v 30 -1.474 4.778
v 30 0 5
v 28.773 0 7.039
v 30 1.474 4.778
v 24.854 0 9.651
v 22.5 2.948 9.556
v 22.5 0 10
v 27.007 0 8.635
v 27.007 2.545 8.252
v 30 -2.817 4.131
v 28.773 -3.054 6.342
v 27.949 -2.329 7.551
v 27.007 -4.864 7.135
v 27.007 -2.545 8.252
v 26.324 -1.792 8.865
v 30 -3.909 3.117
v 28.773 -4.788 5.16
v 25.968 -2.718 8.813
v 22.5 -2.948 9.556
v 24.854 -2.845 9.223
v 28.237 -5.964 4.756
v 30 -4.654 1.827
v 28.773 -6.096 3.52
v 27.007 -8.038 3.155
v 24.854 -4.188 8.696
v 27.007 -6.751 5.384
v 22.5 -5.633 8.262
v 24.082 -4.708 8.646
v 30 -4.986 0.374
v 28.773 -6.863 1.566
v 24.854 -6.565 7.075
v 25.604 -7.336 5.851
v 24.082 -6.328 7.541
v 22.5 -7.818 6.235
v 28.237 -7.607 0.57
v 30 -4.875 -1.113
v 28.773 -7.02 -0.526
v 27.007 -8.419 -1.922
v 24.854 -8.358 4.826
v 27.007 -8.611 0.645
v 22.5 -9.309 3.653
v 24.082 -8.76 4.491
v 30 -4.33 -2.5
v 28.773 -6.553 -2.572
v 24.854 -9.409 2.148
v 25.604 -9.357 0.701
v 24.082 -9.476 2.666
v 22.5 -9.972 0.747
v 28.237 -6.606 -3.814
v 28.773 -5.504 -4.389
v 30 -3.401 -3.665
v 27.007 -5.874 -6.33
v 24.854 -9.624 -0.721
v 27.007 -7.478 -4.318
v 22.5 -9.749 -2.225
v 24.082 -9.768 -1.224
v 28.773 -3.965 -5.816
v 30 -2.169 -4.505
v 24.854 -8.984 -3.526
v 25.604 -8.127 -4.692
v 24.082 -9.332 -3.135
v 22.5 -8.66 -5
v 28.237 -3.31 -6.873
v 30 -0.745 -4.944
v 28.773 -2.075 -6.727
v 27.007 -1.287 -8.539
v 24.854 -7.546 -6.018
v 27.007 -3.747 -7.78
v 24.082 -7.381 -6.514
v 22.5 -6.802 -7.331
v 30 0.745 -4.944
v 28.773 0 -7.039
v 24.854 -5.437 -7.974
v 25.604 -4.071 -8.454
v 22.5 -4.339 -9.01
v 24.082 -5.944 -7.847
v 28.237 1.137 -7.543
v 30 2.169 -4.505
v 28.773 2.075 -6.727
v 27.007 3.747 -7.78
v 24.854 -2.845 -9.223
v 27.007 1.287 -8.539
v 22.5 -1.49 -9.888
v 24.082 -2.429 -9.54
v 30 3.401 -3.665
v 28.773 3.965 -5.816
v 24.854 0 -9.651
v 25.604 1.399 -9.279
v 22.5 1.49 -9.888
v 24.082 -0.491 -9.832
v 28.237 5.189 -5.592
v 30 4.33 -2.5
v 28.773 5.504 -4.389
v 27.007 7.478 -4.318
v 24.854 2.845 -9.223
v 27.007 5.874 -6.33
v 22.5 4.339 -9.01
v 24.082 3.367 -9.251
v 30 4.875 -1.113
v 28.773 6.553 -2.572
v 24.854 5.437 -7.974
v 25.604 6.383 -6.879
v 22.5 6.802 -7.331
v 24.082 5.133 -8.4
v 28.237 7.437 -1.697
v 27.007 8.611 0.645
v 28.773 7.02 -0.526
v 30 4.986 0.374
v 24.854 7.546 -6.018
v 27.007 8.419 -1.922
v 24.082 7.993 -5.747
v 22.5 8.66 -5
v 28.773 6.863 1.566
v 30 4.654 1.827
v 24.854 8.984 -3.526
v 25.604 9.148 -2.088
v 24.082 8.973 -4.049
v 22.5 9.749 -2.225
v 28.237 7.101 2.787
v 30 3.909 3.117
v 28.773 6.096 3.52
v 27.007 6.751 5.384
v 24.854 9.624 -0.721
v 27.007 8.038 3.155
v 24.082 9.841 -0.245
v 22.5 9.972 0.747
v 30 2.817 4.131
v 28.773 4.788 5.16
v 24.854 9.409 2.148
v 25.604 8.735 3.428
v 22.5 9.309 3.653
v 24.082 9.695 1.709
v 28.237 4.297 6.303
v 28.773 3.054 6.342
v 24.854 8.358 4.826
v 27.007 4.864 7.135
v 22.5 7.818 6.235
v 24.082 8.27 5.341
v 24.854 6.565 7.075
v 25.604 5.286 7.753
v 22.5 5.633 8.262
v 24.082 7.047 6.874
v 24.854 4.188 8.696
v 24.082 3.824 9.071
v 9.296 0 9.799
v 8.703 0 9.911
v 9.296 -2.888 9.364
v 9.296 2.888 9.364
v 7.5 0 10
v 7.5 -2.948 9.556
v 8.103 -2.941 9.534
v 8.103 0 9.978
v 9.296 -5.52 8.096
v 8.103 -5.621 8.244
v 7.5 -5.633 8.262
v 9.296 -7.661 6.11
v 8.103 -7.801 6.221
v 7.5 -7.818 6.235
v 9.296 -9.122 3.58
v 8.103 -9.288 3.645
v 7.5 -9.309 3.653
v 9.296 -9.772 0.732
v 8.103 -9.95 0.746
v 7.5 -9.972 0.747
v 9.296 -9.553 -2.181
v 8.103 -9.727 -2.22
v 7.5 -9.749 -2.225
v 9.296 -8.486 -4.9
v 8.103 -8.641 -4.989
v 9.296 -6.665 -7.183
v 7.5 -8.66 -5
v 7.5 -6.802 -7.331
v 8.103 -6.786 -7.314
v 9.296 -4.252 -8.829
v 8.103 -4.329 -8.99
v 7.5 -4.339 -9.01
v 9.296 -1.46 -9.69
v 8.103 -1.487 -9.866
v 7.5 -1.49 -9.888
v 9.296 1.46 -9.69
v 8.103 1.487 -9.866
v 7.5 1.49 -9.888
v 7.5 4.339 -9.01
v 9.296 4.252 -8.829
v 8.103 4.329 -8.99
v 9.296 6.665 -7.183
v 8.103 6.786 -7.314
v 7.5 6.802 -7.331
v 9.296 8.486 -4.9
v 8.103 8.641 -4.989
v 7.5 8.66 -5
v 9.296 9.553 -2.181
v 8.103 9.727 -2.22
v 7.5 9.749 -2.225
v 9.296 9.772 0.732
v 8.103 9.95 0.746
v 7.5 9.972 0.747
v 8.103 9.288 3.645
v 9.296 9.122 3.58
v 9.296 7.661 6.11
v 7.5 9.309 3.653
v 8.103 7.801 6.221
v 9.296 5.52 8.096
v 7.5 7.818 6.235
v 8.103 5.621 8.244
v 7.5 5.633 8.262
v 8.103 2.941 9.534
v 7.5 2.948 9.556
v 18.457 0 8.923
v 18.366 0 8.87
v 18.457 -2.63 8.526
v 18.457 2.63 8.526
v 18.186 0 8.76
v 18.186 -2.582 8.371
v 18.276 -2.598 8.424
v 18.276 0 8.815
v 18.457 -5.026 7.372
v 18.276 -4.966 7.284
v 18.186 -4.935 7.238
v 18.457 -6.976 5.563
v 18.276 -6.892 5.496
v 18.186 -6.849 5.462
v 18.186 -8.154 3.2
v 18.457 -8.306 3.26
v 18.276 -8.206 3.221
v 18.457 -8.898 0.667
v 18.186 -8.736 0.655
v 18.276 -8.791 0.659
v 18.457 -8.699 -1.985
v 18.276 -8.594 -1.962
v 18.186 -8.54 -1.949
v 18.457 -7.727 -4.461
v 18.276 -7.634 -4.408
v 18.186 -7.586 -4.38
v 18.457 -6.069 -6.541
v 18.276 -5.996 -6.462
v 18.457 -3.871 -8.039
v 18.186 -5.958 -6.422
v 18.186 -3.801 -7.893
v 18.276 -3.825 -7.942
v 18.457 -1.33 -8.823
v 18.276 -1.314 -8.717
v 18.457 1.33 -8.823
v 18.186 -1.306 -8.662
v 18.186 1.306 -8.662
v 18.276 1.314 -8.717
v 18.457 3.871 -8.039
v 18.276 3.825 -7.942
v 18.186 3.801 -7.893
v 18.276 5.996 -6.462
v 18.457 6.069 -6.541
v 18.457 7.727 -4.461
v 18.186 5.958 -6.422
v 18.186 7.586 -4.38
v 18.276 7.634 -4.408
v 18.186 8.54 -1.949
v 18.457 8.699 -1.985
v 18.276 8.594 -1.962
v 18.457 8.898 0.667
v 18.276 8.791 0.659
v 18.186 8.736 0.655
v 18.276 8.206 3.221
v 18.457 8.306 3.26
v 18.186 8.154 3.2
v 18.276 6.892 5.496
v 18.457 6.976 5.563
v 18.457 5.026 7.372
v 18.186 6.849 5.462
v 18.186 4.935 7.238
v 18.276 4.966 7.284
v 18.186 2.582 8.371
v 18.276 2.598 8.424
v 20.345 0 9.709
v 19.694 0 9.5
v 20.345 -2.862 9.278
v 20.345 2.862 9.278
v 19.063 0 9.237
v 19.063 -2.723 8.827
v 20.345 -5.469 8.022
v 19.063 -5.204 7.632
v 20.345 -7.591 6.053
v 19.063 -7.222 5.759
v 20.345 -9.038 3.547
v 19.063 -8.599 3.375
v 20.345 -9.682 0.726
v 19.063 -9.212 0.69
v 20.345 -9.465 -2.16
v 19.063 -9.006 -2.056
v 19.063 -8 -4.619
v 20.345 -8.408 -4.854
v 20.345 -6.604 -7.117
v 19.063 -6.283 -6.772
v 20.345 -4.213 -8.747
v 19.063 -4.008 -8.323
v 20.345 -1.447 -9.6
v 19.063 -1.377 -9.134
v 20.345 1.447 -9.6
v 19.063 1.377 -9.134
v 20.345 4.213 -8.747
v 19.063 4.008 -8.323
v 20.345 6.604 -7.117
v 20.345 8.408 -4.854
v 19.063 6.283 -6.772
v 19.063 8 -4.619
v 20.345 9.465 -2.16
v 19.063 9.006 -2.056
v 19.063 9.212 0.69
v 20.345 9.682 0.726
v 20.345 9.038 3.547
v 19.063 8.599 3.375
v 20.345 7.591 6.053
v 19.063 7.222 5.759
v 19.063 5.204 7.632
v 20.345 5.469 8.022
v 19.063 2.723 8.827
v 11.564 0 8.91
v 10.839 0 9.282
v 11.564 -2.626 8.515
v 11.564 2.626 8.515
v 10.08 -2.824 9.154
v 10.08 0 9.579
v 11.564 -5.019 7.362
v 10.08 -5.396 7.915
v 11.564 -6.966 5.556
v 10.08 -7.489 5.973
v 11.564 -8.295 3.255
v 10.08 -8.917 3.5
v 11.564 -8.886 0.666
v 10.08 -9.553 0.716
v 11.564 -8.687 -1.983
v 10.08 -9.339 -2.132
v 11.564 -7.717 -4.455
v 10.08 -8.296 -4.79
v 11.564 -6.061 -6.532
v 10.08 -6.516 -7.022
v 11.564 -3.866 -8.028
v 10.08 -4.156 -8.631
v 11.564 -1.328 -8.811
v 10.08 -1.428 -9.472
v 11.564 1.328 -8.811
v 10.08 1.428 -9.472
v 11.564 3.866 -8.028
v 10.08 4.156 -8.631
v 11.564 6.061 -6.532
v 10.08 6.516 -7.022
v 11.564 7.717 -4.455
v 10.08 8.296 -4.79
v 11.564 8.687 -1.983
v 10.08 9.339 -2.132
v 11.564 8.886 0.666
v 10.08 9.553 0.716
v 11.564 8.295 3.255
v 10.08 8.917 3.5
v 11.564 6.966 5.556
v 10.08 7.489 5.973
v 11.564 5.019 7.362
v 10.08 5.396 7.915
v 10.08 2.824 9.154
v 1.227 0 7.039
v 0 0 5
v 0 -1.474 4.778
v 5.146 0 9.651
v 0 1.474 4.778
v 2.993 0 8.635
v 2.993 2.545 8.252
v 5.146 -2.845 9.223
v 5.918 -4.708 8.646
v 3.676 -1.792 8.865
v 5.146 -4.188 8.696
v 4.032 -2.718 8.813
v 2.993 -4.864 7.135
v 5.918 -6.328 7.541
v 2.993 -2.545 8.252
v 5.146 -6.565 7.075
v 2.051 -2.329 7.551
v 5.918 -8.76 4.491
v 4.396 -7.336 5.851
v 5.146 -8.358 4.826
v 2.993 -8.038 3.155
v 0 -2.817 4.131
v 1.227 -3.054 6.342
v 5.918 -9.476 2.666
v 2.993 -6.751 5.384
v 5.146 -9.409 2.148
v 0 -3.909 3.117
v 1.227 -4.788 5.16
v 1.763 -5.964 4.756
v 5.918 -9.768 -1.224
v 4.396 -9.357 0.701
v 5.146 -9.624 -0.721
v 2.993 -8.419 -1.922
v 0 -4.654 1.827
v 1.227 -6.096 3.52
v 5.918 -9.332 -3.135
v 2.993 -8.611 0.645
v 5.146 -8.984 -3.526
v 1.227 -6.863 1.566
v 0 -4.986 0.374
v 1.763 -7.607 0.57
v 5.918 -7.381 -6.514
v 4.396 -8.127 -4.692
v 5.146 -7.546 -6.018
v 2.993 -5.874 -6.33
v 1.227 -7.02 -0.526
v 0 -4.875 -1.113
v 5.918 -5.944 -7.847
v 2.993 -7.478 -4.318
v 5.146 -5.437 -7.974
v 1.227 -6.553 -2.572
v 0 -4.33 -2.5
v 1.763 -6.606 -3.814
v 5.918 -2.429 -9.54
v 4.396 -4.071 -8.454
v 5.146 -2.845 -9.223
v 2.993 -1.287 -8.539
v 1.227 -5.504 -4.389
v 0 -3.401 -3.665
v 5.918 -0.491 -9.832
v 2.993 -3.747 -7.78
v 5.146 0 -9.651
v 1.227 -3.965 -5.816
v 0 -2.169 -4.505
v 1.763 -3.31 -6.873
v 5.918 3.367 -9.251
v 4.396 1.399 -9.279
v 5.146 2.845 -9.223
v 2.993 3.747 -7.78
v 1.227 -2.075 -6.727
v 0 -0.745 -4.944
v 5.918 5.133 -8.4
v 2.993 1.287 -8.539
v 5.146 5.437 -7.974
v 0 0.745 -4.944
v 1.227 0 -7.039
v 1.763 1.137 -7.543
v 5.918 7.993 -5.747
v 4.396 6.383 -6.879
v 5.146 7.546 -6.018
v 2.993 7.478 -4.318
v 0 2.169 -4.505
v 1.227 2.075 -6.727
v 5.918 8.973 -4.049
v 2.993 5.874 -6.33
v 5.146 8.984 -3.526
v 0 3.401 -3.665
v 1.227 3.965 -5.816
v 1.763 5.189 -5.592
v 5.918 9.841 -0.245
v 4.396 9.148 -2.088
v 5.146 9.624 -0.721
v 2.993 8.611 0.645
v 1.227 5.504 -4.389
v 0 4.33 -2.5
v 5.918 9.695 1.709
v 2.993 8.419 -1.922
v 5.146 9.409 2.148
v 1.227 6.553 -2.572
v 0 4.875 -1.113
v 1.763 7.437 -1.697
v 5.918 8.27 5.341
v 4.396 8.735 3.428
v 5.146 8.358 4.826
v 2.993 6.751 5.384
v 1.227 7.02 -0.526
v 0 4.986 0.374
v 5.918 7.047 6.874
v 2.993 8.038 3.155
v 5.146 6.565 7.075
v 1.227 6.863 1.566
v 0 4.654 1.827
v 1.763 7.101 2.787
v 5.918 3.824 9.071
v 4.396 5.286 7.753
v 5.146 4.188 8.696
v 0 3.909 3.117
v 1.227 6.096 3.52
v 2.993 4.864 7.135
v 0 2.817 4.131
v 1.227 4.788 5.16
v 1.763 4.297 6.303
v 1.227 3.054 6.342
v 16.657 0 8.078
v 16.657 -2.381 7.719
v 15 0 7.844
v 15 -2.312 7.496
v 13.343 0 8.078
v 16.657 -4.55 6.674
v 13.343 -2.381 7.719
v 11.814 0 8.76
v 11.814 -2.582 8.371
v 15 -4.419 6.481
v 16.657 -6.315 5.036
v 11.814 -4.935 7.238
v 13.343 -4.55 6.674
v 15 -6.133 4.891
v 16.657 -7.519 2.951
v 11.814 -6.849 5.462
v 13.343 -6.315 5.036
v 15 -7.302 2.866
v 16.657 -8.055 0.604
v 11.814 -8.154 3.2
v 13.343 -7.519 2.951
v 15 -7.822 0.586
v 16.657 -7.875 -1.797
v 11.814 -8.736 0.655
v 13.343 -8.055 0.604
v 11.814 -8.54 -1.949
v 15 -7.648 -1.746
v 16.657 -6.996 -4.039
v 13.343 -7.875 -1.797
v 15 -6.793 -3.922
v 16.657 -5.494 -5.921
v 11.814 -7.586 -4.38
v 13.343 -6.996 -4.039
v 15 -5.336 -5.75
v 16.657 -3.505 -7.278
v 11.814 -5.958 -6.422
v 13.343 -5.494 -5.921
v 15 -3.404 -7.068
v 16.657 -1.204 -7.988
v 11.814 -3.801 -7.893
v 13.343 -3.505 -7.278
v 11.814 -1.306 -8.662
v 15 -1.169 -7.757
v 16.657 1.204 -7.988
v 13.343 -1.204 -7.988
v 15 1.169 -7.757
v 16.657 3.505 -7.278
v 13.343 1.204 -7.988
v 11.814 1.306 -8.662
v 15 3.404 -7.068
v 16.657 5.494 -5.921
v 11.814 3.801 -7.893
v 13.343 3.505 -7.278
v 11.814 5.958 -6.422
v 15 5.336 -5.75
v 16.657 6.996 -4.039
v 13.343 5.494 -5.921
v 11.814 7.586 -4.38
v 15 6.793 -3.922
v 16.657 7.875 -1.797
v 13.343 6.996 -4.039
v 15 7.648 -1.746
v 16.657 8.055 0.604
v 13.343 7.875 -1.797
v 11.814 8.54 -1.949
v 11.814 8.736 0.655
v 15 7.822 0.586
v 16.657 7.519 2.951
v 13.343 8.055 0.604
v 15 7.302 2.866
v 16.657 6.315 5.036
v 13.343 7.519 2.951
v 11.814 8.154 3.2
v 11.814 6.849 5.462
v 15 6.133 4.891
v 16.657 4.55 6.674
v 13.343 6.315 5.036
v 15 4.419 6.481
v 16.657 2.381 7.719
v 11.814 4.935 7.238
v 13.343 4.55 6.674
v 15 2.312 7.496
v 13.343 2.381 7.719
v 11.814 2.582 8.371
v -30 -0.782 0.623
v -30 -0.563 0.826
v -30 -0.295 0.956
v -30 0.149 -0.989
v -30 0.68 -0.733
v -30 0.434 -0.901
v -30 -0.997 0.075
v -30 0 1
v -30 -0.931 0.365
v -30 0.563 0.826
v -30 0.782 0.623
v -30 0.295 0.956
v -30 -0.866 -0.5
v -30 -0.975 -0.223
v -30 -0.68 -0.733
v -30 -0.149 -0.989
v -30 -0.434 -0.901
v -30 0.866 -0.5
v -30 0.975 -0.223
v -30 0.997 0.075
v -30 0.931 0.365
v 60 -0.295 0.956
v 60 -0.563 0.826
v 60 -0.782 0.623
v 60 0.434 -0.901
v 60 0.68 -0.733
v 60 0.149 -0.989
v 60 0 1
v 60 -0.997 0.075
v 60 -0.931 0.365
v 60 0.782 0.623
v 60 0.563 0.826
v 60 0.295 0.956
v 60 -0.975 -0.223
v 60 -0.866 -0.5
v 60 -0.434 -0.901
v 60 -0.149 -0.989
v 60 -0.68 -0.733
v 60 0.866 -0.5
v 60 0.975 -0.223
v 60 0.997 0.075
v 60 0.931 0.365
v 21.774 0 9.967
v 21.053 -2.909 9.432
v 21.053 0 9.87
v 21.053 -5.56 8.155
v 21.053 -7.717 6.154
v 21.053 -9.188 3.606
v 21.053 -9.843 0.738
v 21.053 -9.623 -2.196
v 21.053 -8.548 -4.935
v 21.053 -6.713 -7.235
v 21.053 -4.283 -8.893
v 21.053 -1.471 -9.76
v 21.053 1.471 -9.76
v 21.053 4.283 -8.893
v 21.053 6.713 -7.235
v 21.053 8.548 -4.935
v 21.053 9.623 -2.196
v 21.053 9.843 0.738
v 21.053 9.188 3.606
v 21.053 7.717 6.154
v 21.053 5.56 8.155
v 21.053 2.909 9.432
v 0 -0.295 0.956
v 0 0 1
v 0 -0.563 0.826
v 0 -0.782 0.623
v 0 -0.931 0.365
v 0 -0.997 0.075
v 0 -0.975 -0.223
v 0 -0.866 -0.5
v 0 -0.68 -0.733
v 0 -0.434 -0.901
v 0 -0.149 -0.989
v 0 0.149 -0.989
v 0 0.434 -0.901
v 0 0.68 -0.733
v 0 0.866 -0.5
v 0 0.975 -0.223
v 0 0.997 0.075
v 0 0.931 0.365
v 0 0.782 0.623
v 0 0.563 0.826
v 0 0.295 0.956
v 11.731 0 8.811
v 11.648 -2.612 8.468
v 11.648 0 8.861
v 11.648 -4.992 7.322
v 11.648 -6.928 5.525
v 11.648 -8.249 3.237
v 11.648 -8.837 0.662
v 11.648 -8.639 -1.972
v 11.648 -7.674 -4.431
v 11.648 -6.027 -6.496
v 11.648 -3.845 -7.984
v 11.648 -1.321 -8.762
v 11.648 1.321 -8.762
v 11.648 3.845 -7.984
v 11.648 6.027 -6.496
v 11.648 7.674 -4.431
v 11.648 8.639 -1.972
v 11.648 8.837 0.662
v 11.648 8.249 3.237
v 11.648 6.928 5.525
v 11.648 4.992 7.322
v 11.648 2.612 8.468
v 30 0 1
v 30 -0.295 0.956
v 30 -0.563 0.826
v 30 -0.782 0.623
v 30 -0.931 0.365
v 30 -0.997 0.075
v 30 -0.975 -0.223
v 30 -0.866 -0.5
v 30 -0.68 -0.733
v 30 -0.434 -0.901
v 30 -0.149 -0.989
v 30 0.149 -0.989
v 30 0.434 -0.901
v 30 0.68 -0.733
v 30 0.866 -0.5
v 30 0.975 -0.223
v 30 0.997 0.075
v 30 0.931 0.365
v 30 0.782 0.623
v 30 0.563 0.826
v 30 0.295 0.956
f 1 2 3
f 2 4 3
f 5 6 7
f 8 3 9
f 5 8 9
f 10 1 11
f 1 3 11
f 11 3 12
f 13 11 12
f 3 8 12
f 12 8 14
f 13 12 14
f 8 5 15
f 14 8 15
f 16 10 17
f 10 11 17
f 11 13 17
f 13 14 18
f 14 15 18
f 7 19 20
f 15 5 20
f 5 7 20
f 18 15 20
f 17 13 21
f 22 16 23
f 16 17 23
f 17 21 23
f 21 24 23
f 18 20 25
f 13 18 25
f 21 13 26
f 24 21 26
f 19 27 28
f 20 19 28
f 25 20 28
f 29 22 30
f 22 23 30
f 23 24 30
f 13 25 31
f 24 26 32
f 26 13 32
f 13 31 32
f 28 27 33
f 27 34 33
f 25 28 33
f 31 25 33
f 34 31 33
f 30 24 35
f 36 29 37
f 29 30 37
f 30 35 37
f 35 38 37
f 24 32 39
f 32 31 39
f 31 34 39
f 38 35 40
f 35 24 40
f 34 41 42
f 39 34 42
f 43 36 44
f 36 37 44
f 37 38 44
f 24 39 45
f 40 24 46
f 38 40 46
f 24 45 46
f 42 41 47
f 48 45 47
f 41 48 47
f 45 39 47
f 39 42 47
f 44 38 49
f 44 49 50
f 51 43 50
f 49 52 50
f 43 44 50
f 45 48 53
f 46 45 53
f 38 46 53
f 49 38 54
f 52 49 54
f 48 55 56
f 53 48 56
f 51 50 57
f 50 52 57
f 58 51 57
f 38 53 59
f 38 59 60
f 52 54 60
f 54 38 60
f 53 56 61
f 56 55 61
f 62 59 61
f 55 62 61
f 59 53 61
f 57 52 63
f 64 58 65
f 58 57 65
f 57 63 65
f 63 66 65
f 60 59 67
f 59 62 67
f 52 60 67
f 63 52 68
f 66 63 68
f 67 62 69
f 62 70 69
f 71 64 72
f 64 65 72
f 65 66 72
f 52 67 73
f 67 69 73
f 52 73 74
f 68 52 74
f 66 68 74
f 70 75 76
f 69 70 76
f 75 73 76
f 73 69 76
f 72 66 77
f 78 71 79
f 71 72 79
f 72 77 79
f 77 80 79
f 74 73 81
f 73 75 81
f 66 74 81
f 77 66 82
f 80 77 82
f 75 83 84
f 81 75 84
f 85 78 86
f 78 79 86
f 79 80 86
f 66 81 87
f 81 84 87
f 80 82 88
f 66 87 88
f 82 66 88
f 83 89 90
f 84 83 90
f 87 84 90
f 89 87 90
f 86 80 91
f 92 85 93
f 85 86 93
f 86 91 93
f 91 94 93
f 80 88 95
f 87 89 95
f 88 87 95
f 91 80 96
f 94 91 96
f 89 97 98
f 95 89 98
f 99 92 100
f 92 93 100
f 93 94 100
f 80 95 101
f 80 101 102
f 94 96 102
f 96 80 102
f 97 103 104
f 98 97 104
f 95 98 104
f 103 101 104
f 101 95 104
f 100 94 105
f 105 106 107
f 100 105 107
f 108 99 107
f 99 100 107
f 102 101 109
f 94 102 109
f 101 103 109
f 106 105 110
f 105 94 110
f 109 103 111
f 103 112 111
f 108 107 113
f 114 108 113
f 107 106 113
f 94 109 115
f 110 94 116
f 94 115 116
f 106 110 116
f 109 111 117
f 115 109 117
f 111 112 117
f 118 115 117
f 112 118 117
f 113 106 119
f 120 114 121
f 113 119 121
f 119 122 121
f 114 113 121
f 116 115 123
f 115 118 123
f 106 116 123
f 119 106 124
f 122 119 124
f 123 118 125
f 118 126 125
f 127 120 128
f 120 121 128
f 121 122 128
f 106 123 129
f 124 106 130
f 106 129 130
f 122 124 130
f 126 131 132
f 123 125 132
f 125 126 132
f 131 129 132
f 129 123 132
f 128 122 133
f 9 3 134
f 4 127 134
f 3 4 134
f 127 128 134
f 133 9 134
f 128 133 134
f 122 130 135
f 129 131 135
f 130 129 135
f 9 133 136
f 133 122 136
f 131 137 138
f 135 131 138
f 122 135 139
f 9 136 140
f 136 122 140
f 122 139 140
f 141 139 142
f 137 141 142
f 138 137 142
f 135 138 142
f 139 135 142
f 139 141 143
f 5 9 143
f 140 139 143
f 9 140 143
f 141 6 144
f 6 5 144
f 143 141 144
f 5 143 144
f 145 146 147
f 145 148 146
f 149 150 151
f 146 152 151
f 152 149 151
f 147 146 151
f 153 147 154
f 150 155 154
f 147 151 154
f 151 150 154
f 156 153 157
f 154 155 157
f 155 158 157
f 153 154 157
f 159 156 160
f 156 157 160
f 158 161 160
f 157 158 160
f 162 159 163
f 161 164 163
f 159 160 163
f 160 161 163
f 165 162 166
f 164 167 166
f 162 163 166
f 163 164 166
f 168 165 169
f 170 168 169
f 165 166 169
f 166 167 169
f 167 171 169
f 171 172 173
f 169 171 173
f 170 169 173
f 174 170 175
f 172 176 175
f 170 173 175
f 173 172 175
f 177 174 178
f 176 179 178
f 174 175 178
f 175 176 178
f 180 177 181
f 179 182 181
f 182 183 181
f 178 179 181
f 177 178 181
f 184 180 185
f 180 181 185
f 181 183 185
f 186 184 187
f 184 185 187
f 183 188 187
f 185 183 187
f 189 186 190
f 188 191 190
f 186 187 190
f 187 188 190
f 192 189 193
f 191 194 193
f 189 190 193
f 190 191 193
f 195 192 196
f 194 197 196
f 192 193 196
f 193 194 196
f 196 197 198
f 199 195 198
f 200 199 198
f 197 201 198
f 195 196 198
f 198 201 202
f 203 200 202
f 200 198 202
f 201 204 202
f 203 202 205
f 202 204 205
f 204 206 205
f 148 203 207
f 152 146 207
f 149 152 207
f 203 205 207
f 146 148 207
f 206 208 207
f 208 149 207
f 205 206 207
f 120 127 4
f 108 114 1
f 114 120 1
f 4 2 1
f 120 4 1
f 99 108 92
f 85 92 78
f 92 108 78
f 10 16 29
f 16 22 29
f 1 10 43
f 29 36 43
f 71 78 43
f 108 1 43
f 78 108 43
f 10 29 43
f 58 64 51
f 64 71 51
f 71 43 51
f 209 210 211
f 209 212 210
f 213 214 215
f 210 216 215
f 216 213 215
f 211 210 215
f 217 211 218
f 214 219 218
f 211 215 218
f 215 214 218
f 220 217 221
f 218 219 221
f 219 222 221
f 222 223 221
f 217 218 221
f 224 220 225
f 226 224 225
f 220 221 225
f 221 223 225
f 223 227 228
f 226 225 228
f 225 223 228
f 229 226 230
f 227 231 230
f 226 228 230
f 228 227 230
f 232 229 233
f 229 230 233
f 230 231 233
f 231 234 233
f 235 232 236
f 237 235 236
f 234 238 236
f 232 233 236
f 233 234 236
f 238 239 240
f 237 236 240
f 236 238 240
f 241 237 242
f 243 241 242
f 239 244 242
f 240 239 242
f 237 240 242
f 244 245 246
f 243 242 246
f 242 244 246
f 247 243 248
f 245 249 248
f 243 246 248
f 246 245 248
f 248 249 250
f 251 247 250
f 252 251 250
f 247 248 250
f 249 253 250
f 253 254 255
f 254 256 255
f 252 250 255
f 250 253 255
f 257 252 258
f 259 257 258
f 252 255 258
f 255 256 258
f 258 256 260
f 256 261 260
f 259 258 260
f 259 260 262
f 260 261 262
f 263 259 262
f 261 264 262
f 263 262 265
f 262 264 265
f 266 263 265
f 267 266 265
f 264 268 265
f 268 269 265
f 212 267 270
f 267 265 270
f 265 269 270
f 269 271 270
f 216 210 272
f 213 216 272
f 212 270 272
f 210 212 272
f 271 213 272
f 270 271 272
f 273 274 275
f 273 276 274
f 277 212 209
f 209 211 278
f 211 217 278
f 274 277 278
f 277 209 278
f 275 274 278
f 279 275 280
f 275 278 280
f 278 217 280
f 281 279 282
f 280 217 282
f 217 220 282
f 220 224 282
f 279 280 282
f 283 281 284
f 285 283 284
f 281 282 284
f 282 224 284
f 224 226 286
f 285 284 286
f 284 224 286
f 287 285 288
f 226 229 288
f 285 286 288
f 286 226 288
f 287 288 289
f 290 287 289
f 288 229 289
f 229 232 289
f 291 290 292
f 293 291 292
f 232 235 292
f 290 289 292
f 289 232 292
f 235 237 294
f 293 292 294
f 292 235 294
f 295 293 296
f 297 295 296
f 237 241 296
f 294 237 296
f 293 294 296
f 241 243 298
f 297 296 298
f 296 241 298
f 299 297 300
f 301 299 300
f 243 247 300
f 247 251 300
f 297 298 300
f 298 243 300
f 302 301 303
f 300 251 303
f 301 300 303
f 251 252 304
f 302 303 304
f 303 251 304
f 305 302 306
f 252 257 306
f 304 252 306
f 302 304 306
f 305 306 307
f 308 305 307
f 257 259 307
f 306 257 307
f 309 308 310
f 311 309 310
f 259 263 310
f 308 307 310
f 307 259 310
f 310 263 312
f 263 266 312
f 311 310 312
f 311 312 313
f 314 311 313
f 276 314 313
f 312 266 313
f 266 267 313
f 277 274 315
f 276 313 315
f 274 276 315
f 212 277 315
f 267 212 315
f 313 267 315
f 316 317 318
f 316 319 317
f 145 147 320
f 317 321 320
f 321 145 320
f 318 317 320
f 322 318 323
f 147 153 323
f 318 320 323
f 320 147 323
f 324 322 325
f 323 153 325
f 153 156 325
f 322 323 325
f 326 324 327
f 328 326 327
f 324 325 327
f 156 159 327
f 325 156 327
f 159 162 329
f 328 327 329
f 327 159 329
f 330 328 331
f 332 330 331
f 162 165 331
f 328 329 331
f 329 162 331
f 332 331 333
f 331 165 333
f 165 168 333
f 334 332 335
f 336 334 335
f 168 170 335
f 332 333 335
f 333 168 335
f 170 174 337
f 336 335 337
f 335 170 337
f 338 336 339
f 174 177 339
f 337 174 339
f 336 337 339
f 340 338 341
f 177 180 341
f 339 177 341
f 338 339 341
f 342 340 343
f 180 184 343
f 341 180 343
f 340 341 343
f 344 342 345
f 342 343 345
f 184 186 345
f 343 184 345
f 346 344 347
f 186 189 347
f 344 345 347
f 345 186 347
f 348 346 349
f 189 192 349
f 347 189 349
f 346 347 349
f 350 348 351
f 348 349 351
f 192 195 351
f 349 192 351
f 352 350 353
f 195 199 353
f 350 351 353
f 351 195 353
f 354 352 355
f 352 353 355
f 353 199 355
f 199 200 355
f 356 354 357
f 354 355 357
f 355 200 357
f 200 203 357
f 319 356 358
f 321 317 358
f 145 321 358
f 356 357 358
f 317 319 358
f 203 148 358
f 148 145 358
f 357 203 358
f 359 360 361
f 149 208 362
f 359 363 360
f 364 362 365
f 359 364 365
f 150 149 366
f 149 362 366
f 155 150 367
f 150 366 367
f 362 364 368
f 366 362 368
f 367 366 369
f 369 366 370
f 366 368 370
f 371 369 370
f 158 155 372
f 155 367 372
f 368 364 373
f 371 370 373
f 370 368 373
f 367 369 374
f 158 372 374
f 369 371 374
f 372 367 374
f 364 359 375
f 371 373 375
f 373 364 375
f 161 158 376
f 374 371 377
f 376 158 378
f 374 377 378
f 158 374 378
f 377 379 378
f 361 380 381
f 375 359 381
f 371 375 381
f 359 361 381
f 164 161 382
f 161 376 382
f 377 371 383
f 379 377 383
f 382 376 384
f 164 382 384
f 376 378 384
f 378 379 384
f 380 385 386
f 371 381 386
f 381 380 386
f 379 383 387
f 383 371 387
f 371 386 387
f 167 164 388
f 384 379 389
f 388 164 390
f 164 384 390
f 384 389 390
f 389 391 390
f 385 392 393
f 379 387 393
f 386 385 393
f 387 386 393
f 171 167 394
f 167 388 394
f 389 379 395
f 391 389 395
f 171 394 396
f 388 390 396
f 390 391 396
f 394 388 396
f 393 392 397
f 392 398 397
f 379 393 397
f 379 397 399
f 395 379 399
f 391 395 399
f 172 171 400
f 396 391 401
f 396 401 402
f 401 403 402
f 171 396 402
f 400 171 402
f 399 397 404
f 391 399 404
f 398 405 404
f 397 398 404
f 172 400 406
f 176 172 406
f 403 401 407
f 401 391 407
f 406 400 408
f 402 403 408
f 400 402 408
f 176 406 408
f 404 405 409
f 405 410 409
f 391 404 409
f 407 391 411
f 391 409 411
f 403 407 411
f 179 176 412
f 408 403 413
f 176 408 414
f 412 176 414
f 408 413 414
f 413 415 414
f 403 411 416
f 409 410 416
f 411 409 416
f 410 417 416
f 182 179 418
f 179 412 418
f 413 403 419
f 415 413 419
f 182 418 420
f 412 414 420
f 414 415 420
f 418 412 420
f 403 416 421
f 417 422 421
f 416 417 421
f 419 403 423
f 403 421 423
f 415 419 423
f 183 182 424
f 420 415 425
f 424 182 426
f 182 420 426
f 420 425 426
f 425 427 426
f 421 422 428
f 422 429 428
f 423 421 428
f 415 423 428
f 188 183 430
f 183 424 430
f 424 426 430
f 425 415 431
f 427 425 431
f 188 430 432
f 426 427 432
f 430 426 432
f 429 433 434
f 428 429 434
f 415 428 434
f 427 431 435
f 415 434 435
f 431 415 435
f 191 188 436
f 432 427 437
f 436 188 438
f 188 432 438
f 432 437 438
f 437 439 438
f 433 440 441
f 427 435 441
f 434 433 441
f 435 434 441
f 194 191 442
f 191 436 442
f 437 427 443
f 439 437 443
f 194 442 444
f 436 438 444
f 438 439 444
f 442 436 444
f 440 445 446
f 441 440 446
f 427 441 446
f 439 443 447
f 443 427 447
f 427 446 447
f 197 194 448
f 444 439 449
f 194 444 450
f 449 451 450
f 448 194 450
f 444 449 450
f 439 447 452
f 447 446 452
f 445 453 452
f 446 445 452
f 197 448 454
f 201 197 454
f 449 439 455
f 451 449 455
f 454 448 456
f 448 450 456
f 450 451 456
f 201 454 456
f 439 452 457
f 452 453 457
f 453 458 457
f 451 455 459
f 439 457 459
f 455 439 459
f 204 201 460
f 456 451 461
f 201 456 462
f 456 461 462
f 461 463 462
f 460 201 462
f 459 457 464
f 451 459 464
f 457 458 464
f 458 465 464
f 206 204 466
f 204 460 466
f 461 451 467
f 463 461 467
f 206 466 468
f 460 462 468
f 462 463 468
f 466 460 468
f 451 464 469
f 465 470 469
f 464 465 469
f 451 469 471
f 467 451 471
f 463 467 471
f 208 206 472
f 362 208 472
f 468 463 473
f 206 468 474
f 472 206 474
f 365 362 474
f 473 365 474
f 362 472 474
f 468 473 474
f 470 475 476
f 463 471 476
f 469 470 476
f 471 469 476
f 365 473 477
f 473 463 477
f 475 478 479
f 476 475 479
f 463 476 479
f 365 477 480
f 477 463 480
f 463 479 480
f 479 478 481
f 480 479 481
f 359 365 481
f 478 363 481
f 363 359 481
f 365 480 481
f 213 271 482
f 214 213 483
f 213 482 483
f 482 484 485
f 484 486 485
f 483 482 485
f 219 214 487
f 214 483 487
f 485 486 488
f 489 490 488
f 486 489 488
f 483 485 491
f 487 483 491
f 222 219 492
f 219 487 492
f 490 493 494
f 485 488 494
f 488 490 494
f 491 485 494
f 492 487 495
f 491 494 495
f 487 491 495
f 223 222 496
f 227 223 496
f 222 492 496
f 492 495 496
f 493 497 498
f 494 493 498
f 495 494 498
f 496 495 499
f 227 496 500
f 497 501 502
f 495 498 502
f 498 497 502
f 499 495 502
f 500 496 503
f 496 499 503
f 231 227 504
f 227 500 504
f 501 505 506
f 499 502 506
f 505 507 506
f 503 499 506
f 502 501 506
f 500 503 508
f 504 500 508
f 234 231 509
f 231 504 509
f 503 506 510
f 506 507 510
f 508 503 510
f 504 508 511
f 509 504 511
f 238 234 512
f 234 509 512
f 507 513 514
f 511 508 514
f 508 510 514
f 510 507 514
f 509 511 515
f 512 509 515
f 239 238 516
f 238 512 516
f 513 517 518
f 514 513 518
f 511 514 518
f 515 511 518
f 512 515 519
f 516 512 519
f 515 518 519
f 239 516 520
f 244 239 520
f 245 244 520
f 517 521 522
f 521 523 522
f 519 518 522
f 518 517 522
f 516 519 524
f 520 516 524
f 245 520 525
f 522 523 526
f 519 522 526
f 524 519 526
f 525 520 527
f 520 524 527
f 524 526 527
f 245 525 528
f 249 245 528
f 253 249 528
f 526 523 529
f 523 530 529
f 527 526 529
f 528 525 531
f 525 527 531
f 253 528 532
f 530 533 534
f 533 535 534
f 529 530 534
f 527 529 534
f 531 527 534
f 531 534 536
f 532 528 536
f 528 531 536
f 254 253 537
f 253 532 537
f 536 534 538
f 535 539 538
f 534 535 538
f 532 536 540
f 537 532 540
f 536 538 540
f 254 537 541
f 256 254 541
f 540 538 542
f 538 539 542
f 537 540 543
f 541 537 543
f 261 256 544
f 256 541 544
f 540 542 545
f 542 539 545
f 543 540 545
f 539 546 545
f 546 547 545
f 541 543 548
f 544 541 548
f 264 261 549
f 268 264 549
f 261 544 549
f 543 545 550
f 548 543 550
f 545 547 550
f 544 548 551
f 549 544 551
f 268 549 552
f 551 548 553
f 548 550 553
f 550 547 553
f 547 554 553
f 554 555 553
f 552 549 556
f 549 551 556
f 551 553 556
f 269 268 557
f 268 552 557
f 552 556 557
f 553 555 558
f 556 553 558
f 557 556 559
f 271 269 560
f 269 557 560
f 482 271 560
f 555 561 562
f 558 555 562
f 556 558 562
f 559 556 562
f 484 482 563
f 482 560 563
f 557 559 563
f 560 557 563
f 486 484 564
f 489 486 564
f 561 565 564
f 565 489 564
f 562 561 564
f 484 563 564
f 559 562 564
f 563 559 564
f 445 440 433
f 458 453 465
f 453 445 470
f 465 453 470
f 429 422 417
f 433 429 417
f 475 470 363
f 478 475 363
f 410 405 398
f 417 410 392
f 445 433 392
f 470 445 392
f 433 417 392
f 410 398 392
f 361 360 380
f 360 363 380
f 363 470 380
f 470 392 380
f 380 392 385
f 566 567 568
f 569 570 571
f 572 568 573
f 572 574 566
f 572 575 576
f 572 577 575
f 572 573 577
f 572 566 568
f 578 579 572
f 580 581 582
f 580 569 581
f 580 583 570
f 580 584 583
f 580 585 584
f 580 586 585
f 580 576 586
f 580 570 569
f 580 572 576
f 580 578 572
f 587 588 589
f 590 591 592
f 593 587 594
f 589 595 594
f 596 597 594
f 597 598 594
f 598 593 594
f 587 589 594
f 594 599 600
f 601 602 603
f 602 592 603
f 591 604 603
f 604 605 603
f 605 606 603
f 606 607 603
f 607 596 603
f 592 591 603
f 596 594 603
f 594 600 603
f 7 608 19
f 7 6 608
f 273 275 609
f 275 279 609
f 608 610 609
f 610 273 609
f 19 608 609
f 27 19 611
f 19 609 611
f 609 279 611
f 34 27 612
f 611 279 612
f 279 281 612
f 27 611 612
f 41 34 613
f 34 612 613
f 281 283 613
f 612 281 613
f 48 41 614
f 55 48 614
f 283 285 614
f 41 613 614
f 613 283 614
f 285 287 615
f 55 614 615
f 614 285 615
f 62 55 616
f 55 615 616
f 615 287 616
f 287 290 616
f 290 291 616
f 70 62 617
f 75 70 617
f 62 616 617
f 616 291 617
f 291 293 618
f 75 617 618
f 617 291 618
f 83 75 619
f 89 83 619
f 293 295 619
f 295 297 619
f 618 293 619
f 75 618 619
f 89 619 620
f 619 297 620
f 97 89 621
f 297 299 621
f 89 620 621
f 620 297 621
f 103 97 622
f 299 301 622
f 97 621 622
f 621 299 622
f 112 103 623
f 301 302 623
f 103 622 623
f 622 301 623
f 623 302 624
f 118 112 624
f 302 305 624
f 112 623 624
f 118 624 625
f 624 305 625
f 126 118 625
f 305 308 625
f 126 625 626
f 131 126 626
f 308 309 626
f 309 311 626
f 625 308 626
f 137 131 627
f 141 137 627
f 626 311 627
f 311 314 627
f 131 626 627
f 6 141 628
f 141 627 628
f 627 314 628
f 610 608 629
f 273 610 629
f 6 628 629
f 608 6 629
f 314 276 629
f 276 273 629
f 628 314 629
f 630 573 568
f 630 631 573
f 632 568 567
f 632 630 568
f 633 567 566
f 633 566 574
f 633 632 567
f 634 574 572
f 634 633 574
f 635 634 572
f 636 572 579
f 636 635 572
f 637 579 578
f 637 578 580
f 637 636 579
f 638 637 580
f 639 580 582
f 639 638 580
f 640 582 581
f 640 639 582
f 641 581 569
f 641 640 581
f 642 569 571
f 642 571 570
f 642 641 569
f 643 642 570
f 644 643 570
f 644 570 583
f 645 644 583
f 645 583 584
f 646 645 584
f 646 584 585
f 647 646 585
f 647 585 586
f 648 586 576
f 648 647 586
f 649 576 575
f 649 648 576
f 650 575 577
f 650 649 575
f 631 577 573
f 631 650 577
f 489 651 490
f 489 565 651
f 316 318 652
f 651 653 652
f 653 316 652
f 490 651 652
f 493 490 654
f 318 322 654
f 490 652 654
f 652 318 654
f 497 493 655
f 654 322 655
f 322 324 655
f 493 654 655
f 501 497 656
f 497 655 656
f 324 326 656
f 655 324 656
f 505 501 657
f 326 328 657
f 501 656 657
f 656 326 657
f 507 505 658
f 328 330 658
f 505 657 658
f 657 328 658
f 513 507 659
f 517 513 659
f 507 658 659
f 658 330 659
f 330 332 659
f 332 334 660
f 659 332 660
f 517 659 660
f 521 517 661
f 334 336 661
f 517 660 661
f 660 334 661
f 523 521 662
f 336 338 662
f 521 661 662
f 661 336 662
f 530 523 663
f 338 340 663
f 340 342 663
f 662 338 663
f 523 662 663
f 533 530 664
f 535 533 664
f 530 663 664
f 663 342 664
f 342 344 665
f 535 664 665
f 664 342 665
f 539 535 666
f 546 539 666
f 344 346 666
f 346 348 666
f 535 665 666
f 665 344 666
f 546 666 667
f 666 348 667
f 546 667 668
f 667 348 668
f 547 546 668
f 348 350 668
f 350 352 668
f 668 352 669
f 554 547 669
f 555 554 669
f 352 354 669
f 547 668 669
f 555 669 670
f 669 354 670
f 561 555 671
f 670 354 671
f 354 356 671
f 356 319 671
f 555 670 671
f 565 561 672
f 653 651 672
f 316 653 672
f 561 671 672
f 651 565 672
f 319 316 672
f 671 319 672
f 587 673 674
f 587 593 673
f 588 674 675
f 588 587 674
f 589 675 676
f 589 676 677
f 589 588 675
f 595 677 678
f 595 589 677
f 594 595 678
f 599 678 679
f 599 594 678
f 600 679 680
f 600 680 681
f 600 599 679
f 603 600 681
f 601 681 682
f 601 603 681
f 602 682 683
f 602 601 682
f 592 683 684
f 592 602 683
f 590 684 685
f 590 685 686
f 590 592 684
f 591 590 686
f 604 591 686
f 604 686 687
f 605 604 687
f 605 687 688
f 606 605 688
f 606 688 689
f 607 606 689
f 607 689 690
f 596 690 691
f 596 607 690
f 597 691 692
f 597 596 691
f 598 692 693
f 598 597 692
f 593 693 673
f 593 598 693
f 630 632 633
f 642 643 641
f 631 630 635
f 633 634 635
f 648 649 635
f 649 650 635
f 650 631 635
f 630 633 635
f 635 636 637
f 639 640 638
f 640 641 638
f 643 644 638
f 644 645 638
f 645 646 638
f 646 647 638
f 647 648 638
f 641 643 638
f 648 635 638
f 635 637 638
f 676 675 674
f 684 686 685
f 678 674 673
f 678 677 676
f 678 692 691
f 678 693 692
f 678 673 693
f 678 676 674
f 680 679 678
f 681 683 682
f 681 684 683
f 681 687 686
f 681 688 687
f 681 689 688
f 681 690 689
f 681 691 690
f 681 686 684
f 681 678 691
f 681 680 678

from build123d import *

# Parameters (mm, degrees)
F0_W = 30
F0_H = 1


# Not quite as in the source:
# - a feature names something its author has since deleted; it is built from what else it names
# - the program builds the solid bodies; features that only make, move or delete a surface that nothing else refers to are left out


with BuildPart() as f1:
    # F0 (on Front) → F1 (revolve)
    with BuildSketch(Plane.XZ):
        Polygon((0, 1), (0, 0), (30, 0), (30, 1), (30, 5), (0, 5), align=None)
        with BuildLine():
            ThreePointArc((7.5, 10), (2.9930609057, 8.6354086415), (0, 5))
            Line((0, 5), (30, 5))
            ThreePointArc((30, 5), (27.0069390843, 8.6354086482), (22.4999999759, 10))
            ThreePointArc((22.4999999759, 10), (21.4125129517, 9.9268939958), (20.3445956085, 9.7088915559))
            ThreePointArc((20.3445956085, 9.7088915559), (19.3760252959, 9.3754271244), (18.457110969, 8.9227424246))
            ThreePointArc((18.457110969, 8.9227424246), (18.3206839191, 8.8427070903), (18.185840708, 8.7600311984))
            ThreePointArc((18.185840708, 8.7600311984), (15, 7.8443619295), (11.814159292, 8.7600311984))
            ThreePointArc((11.814159292, 8.7600311984), (11.6898538017, 8.8363755911), (11.5641977003, 8.9104759649))
            ThreePointArc((11.5641977003, 8.9104759649), (10.4634096842, 9.4403042268), (9.2956262041, 9.7990994148))
            ThreePointArc((9.2956262041, 9.7990994148), (8.4034149808, 9.9496186518), (7.5, 10))
        make_face()
    revolve(axis=Axis((15, 0, 0), (1, 0, 0)))


with BuildPart() as f2:
    # F0 (on Front) → F2 (revolve)
    with BuildSketch(Plane.XZ):
        with Locations((-15, 0.5)):
            Rectangle(F0_W, F0_H)
    revolve(axis=Axis((15, 0, 0), (1, 0, 0)))


with BuildPart() as f2b:
    # F0 (on Front) → F2, piece 2 (revolve)
    with BuildSketch(Plane.XZ):
        with Locations((45, 0.5)):
            Rectangle(F0_W, F0_H)
    revolve(axis=Axis((15, 0, 0), (1, 0, 0)))


solid = Compound([f1.part, f2.part, f2b.part])
